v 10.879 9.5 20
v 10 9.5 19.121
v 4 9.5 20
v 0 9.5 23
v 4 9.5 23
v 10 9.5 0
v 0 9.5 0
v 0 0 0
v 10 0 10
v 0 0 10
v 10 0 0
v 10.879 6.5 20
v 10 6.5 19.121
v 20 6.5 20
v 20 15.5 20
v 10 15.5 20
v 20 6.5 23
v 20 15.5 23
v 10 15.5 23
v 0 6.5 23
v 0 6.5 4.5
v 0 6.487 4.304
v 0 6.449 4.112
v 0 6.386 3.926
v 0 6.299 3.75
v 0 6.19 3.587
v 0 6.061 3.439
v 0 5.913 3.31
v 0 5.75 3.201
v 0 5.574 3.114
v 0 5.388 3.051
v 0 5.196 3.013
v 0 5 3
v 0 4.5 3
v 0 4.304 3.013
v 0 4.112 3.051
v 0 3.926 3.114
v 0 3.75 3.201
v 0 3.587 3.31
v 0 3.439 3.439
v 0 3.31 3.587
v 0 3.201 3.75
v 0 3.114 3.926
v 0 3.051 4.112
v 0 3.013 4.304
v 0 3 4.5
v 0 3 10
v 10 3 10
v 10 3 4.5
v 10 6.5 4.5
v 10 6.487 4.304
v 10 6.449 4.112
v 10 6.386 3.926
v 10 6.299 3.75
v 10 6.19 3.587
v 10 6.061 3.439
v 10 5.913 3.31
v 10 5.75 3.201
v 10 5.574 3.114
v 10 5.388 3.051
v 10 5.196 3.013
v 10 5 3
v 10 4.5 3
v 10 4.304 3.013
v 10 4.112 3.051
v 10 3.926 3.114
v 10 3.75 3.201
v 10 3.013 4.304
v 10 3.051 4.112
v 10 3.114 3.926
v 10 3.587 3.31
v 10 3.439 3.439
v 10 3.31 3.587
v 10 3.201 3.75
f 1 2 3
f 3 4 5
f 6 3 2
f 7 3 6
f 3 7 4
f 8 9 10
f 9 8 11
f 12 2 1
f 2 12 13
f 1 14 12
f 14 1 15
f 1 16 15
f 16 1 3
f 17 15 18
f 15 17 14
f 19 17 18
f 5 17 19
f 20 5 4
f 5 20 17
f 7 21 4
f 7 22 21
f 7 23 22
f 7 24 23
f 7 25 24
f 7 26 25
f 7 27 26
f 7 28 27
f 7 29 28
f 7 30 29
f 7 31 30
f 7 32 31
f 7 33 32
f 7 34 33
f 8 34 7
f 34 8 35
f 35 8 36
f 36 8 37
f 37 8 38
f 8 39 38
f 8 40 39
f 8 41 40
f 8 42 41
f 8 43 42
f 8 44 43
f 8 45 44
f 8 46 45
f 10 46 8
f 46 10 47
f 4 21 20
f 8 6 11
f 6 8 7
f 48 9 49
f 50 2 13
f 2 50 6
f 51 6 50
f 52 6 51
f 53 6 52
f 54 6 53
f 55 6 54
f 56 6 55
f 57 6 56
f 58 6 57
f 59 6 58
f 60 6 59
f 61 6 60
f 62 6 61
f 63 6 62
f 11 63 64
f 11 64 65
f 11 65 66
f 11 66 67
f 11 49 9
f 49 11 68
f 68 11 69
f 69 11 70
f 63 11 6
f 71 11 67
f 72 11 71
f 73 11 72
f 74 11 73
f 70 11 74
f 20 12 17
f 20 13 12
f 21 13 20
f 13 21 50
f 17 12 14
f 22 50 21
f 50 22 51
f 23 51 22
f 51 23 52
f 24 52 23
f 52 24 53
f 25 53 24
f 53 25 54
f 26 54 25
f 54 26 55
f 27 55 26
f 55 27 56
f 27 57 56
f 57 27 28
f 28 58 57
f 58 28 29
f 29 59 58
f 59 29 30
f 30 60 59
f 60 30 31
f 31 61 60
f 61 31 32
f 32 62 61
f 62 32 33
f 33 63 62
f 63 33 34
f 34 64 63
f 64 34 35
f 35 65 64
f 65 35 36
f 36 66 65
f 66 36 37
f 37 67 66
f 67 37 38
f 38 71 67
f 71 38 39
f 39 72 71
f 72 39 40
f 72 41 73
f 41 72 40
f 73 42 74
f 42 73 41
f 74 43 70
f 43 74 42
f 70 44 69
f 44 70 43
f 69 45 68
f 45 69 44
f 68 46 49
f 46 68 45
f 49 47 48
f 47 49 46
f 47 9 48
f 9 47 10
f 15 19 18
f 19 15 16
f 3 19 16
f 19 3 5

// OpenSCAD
// This is something quick and specific to my cirucular saw.
// The code you'll find is not very polished.

WALL = 3;
WIDTH = 10;
LEVER = 10;
CUTOUT = 3.5;
HEIGHT = 20;

x = LEVER+WIDTH;
y = WALL + CUTOUT + WALL;
z = HEIGHT + WALL;

$fa = $preview? 12 : 6;
$fs = $preview? 2 : 0.2;

module xz_sketch() {
    offset(delta=-WALL/2, chamfer=true) offset(delta=WALL/2) difference() {
        square([x,z]);
        translate([WIDTH,0]) square([LEVER,HEIGHT]);
    } 
}

module yz_sketch() {
    offset(r=-WALL/2) offset(delta=WALL/2) {
        square([WALL,LEVER]);
        translate([WALL,0]) square([CUTOUT, WALL]);
        translate([WALL+CUTOUT,0]) square([WALL, z]);
    }
}

intersection() {
    translate([0,WALL+CUTOUT+WALL,0]) rotate([90,0])
        linear_extrude(WALL+CUTOUT+WALL) xz_sketch();
    rotate([90,0,90])linear_extrude(LEVER+WIDTH) yz_sketch();
}
translate([WIDTH,WALL+CUTOUT+WALL,HEIGHT]) {
    cube([LEVER,WALL*2,WALL]);
    linear_extrude(WALL) polygon([[-2*WALL,0], [0,0], [0,2*WALL]]);
}
